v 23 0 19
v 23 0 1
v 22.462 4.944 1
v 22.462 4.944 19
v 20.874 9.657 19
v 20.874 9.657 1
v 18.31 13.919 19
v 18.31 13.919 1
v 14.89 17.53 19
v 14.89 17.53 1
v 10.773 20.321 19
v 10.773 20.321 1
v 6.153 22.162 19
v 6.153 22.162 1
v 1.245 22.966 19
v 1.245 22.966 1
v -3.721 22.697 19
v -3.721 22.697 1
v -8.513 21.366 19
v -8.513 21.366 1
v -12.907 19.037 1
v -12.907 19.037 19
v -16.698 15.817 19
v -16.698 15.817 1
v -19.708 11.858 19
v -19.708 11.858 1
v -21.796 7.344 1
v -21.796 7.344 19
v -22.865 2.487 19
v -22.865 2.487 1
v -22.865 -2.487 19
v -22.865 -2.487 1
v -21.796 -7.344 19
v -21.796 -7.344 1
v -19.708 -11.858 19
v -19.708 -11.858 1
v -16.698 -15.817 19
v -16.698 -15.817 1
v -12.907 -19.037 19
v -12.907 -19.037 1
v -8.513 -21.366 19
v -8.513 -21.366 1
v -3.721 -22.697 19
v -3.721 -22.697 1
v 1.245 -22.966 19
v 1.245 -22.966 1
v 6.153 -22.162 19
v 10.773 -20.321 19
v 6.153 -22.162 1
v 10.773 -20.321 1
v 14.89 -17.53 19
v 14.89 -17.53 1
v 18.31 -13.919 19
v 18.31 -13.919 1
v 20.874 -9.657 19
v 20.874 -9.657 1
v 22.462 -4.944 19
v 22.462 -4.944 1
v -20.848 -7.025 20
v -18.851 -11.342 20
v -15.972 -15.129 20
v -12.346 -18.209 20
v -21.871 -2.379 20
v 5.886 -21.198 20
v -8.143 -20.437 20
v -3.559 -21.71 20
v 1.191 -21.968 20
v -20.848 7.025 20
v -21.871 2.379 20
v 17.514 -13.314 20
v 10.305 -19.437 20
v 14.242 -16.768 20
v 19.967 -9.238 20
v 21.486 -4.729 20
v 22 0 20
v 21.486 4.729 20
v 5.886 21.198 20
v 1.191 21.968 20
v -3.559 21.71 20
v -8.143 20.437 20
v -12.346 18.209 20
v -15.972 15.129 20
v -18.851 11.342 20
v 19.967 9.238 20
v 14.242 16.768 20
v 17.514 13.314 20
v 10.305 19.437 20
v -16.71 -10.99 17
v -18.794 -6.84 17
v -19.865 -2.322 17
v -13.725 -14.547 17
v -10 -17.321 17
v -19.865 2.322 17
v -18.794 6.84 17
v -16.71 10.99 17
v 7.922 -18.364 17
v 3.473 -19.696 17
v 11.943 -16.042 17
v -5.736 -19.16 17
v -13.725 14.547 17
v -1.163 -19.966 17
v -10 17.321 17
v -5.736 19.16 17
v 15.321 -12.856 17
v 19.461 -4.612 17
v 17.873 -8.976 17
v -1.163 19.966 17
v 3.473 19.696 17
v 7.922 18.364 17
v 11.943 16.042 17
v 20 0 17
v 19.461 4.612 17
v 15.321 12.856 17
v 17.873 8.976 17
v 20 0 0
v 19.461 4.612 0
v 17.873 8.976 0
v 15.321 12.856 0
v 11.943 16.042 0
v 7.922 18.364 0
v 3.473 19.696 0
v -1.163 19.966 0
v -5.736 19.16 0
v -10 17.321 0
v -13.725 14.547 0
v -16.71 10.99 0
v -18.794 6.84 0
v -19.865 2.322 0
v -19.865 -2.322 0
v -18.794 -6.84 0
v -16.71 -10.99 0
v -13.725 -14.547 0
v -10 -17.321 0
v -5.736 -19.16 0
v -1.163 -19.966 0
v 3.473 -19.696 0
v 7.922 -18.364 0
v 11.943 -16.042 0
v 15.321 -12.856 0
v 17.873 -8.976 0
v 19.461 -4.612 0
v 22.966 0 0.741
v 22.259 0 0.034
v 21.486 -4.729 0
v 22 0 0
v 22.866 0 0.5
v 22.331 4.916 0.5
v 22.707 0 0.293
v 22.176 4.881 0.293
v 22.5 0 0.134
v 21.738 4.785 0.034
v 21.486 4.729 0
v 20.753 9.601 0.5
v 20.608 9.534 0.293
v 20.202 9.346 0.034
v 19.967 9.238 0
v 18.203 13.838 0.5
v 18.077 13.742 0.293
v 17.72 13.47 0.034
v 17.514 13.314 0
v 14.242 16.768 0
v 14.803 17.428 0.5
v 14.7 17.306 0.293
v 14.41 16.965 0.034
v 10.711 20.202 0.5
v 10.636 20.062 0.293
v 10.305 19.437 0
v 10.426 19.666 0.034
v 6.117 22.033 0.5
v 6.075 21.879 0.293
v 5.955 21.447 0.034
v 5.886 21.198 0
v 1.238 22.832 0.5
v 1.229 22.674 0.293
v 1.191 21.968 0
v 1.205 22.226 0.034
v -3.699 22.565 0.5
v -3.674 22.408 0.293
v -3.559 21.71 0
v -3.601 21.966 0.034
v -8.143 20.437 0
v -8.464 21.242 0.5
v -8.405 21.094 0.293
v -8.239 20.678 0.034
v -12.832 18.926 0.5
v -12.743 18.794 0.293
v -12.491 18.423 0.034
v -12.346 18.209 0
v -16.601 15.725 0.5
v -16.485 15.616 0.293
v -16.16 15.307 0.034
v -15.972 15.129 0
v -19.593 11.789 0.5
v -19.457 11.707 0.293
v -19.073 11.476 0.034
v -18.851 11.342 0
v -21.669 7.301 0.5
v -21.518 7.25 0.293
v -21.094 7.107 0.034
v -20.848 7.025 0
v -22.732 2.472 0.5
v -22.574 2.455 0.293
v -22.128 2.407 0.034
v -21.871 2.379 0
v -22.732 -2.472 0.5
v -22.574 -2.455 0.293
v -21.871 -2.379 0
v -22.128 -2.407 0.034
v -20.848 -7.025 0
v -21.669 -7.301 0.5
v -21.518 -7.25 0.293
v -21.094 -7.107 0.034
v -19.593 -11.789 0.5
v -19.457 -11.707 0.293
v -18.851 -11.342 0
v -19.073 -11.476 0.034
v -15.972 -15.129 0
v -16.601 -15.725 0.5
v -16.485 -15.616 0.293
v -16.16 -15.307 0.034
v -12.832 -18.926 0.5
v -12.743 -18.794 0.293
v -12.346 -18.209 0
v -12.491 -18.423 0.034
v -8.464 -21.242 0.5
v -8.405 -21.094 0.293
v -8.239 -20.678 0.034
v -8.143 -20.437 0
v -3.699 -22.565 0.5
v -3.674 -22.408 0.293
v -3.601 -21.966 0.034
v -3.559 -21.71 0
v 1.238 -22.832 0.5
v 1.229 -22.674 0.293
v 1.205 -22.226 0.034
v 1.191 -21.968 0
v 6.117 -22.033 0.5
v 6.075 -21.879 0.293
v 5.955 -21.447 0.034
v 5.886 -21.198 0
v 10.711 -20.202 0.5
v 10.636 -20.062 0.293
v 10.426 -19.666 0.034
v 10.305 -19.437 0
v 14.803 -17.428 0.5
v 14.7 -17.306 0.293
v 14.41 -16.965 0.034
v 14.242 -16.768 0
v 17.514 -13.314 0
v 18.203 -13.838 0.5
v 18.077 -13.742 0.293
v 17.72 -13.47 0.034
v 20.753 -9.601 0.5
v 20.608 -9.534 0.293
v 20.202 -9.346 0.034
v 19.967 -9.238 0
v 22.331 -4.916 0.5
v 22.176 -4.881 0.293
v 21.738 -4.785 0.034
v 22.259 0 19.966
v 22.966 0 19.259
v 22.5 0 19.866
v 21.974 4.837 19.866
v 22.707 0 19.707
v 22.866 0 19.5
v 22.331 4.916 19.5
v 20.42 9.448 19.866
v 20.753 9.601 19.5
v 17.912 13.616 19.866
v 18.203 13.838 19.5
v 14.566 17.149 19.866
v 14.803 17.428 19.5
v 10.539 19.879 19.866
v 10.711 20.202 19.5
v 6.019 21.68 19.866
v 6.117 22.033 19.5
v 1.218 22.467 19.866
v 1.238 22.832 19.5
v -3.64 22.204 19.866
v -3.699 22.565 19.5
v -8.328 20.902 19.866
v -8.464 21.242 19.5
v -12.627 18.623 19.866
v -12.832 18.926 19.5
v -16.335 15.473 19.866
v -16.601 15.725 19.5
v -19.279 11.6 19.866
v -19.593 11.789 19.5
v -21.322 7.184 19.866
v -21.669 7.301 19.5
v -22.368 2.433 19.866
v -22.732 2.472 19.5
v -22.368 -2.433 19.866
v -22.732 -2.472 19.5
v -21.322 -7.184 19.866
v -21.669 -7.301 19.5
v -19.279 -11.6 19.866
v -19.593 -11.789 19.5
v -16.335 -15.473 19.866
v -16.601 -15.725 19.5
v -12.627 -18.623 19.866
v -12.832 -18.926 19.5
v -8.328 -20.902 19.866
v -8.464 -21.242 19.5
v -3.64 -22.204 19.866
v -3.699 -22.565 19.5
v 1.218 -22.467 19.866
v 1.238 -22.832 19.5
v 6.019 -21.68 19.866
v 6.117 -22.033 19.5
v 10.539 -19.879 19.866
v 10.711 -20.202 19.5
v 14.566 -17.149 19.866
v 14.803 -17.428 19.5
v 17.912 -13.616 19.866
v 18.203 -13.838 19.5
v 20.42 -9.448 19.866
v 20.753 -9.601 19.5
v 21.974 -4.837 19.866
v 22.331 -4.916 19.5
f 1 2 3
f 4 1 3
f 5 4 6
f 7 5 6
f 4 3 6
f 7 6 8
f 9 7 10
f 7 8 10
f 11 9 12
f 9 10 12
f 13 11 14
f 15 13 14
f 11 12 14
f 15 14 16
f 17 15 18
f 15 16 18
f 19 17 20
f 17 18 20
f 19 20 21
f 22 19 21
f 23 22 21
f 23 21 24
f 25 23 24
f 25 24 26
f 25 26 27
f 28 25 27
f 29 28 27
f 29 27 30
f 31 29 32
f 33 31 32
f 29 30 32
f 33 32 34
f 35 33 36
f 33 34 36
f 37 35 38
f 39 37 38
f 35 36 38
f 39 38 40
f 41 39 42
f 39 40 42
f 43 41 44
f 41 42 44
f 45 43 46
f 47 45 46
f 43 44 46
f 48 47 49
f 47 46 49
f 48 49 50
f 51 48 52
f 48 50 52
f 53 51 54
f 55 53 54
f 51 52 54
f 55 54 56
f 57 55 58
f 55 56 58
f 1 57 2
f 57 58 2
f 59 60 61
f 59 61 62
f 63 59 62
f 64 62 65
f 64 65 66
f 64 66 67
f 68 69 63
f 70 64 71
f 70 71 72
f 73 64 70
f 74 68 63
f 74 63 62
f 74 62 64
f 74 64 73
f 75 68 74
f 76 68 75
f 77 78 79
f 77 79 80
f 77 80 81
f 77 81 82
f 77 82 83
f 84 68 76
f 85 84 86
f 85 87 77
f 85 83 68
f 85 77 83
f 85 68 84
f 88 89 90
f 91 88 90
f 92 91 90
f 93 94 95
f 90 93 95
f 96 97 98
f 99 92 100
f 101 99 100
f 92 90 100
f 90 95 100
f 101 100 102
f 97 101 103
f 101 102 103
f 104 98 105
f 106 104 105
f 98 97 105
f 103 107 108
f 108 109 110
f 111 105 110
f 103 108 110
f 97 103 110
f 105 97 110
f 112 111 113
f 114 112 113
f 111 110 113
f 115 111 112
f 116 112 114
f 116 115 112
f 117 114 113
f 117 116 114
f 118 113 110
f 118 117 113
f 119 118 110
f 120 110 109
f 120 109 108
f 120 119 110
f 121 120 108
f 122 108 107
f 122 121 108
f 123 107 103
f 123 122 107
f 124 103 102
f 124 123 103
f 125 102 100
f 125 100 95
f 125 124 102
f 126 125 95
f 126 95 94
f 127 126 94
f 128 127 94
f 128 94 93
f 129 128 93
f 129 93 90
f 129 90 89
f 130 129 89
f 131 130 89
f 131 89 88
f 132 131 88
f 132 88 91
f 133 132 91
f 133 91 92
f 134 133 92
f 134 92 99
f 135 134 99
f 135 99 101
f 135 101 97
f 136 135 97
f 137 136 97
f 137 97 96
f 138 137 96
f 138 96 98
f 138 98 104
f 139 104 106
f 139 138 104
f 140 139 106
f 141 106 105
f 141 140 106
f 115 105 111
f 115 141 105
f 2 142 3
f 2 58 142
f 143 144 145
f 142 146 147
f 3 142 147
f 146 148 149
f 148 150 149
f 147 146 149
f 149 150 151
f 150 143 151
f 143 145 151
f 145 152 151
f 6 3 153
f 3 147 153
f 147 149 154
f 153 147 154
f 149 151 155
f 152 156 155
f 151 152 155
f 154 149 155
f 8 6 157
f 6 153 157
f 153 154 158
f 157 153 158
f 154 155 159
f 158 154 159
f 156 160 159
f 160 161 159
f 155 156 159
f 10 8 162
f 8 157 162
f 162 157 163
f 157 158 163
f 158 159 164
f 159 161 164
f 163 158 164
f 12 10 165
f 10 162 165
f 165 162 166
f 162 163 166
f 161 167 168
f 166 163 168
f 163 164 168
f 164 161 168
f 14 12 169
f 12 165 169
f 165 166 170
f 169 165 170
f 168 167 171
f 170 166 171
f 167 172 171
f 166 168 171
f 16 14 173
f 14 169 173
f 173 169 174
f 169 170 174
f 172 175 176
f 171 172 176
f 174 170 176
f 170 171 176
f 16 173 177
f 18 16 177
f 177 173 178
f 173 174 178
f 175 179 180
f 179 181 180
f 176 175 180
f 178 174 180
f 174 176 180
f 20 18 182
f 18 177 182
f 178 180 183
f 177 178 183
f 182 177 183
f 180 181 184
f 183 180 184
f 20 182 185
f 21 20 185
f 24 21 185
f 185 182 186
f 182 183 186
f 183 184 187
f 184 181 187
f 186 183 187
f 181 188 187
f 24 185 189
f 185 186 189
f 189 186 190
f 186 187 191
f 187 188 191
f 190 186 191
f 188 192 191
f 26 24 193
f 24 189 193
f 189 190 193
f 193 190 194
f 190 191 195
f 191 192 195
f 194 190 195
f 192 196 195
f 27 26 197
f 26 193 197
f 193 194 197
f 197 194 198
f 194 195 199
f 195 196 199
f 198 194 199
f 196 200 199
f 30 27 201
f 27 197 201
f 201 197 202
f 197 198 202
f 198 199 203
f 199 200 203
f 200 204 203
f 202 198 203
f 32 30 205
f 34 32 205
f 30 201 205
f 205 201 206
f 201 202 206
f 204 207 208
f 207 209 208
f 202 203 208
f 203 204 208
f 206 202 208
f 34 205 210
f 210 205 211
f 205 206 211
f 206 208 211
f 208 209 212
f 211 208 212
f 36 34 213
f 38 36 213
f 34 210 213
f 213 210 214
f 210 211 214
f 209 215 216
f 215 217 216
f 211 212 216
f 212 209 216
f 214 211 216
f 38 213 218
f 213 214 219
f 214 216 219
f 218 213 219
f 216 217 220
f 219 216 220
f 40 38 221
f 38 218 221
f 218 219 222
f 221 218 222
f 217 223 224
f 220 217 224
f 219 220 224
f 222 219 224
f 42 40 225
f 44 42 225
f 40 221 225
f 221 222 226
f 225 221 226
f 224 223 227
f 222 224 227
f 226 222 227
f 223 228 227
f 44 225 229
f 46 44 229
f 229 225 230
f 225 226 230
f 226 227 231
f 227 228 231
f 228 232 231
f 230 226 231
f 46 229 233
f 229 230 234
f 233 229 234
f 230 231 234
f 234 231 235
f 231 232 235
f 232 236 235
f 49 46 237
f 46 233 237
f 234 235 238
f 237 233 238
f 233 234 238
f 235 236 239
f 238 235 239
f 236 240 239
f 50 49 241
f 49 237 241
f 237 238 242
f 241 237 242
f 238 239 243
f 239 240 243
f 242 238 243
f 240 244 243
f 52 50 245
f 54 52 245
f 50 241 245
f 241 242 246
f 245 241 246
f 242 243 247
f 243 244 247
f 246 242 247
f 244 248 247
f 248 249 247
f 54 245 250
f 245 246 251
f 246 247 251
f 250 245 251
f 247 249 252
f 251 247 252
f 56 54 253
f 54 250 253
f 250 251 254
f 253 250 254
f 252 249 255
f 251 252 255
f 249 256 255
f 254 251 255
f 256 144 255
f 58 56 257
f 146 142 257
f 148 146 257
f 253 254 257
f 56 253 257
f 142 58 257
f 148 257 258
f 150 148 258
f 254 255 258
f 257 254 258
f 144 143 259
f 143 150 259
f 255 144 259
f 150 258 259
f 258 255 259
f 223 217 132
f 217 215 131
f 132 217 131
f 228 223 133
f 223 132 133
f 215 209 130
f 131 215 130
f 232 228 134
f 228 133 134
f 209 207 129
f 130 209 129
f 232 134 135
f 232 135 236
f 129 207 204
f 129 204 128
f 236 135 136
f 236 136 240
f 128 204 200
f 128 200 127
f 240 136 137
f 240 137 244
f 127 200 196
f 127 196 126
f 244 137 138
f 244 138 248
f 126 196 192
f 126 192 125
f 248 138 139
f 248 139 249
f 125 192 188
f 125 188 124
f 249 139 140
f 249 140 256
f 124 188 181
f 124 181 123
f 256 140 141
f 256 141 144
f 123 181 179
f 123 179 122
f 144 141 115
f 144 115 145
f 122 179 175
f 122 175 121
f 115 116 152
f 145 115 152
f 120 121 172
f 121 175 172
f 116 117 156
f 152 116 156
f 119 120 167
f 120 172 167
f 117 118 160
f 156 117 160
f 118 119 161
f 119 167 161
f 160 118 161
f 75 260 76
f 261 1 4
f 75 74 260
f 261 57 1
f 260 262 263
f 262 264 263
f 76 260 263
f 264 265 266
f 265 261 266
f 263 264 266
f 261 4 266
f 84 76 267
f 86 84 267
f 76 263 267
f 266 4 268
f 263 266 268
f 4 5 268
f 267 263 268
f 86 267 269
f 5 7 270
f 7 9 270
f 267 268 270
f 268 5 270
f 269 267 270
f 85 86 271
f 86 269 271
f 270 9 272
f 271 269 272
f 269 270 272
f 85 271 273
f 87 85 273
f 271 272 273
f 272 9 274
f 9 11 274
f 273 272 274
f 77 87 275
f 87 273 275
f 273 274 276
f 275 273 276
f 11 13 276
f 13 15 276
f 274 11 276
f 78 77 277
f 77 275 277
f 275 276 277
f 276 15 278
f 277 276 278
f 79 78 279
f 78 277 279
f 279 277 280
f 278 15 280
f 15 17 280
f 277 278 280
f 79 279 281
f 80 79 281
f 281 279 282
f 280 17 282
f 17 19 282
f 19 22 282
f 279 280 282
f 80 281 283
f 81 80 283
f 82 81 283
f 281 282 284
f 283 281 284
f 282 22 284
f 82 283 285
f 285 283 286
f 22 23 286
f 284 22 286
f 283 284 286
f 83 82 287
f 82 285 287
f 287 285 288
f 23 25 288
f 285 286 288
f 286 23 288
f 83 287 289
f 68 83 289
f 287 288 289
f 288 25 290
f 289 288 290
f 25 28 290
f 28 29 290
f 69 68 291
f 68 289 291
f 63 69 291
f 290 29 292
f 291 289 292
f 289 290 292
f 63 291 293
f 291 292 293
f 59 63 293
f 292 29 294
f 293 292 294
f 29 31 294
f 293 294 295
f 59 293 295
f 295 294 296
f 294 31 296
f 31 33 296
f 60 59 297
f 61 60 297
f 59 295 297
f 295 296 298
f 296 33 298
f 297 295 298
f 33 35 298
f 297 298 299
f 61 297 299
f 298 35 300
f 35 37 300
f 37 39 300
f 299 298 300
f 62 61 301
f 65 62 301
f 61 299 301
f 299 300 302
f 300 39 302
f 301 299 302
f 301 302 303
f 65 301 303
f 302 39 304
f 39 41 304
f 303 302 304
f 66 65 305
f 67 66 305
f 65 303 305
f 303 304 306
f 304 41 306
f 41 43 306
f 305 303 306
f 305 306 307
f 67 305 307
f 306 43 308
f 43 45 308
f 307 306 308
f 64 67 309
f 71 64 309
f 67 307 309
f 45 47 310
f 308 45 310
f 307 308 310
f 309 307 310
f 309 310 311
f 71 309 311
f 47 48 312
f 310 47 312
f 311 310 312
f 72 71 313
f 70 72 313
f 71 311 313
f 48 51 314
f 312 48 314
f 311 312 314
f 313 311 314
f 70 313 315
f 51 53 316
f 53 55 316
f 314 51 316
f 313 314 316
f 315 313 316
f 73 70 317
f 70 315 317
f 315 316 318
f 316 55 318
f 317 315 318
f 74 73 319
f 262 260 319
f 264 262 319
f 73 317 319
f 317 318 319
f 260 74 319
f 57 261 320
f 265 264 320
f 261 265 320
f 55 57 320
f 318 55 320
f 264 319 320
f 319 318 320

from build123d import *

# Parameters (mm, degrees)
F0_R     = 23
F0_R_2   = 20
F1_DEPTH = 20
F2_R     = 20
F3_DEPTH = 3
F4_R     = 1


with BuildPart() as f1:
    # F0 (on Top) → F1 (new body)
    with BuildSketch(Plane.XY):
        Circle(F0_R)
        Circle(F0_R_2, mode=Mode.SUBTRACT)
    extrude(amount=F1_DEPTH)

    # F2 (on face) → F3 (join)
    with BuildSketch(Plane.XY.offset(20)):
        Circle(F2_R)
    extrude(amount=-F3_DEPTH)

    # F4
    f4_edges = [f1.edges().sort_by_distance(p)[0] for p in [
        (-23, 0, 0),
        (-23, 0, 20),
    ]]
    fillet(f4_edges, radius=F4_R)


solid = f1.part
